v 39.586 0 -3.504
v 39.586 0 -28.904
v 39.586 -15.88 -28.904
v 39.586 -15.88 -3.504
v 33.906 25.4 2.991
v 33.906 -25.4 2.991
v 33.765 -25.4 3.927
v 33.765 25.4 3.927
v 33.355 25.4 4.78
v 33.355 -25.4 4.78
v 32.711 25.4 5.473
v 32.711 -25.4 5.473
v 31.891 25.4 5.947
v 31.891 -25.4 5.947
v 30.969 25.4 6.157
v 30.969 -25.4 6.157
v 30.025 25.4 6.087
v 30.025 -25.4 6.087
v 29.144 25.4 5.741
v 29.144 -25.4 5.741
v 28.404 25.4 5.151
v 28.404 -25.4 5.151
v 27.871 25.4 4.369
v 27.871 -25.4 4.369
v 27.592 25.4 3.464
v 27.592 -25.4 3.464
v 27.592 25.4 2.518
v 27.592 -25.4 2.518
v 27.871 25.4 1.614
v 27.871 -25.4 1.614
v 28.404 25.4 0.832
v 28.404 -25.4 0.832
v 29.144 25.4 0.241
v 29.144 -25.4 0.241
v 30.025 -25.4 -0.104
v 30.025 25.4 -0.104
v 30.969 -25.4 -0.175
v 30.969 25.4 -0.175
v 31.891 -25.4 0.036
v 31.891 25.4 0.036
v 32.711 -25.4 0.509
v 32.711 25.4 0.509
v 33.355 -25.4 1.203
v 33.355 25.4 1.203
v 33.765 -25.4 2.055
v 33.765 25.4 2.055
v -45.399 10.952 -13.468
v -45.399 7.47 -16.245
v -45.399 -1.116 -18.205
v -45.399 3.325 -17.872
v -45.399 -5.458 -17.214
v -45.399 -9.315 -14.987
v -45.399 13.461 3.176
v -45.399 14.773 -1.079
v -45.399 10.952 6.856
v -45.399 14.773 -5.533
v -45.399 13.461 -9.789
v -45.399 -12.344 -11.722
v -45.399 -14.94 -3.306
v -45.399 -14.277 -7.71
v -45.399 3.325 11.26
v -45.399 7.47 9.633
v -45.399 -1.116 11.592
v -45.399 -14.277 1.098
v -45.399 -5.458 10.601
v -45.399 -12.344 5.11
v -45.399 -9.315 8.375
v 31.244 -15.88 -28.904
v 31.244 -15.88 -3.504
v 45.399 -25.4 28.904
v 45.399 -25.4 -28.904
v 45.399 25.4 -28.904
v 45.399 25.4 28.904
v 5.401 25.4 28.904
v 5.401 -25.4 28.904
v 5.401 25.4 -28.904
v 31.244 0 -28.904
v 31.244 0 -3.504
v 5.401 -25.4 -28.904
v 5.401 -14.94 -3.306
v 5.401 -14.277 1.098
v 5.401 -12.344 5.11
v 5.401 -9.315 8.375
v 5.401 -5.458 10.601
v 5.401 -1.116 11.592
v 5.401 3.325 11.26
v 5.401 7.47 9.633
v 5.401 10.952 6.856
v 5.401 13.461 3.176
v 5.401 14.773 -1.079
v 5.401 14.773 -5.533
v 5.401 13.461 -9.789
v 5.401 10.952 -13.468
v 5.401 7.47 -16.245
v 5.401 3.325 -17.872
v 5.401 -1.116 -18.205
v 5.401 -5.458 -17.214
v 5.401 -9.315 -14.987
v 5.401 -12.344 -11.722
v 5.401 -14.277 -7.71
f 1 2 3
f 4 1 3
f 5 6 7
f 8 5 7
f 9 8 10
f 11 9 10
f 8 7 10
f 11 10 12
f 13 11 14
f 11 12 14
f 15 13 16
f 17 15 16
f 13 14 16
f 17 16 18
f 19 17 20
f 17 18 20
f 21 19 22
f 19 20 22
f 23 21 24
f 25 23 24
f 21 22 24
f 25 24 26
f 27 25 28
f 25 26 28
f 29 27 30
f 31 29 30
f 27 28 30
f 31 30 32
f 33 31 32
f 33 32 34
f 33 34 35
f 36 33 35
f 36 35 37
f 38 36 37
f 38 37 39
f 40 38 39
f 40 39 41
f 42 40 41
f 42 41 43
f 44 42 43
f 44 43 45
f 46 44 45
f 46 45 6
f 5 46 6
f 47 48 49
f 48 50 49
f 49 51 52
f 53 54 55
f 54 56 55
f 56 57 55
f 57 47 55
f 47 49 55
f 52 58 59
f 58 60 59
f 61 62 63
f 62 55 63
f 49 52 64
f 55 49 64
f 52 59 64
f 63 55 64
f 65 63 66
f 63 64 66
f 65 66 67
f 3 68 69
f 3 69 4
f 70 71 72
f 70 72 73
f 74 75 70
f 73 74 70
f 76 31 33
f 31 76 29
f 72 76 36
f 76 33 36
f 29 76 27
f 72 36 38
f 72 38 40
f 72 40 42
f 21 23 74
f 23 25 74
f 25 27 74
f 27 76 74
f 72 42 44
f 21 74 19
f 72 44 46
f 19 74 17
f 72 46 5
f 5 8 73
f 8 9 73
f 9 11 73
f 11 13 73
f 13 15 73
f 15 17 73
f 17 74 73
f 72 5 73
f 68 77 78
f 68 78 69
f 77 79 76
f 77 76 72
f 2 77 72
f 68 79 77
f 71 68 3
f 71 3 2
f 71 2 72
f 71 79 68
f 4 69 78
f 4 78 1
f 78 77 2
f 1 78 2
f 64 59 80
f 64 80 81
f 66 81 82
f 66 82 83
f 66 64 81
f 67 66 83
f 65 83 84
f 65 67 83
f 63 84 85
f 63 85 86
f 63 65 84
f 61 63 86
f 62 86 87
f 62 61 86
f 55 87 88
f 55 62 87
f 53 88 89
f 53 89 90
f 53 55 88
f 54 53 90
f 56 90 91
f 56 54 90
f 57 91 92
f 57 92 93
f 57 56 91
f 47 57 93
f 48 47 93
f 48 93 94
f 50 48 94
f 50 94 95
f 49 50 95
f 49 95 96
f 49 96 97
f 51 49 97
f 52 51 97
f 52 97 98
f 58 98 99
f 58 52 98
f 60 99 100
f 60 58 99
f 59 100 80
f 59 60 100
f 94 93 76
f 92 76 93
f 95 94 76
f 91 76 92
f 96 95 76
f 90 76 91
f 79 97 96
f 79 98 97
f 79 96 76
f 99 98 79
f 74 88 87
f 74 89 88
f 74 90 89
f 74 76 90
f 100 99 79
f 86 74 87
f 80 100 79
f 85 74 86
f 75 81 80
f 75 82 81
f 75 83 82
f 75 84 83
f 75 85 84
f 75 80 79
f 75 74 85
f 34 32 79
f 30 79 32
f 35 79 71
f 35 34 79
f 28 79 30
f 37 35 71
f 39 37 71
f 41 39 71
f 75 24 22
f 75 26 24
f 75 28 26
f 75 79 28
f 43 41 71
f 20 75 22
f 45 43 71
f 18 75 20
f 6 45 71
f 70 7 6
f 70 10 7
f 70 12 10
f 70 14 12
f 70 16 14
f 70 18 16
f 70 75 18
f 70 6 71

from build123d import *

# Parameters (mm, degrees)
F0_W     = 90.797476
F0_H     = 57.807724
F1_DEPTH = 25.4
F2_W     = 50.8
F2_H     = 57.807724
F2_R     = 14.940319
F3_DEPTH = 50.8
F5_D     = 6.35
F6_W     = 8.342021
F6_H     = 15.879793
F7_DEPTH = 25.4


with BuildPart() as f1:
    # F0 (on Front) → F1 (new body, symmetric)
    with BuildSketch(Plane.XZ):
        Rectangle(F0_W, F0_H)
    extrude(amount=F1_DEPTH, both=True)

    # F2 (on face) → F3 (cut)
    with BuildSketch(Plane(origin=(-45.398738, 0, 0), x_dir=(0, -1, 0), z_dir=(-1, 0, 0))):
        Rectangle(F2_W, F2_H)
        with Locations((0, -3.306166)):
            Circle(F2_R, mode=Mode.SUBTRACT)
    extrude(amount=-F3_DEPTH, mode=Mode.SUBTRACT)

    # F5 (through all)
    with Locations(Plane(origin=(0, 25.4, 0), x_dir=(-1, 0, 0), z_dir=(0, 1, 0))):
        with Locations((-30.731432, 2.991115)):
            Hole(F5_D / 2)

    # F6 (on face) → F7 (cut)
    with BuildSketch(Plane(origin=(0, 0, -28.903862), x_dir=(1, 0, 0), z_dir=(0, 0, -1))):
        with Locations((35.414792, 7.939896)):
            Rectangle(F6_W, F6_H)
    extrude(amount=-F7_DEPTH, mode=Mode.SUBTRACT)


solid = f1.part
